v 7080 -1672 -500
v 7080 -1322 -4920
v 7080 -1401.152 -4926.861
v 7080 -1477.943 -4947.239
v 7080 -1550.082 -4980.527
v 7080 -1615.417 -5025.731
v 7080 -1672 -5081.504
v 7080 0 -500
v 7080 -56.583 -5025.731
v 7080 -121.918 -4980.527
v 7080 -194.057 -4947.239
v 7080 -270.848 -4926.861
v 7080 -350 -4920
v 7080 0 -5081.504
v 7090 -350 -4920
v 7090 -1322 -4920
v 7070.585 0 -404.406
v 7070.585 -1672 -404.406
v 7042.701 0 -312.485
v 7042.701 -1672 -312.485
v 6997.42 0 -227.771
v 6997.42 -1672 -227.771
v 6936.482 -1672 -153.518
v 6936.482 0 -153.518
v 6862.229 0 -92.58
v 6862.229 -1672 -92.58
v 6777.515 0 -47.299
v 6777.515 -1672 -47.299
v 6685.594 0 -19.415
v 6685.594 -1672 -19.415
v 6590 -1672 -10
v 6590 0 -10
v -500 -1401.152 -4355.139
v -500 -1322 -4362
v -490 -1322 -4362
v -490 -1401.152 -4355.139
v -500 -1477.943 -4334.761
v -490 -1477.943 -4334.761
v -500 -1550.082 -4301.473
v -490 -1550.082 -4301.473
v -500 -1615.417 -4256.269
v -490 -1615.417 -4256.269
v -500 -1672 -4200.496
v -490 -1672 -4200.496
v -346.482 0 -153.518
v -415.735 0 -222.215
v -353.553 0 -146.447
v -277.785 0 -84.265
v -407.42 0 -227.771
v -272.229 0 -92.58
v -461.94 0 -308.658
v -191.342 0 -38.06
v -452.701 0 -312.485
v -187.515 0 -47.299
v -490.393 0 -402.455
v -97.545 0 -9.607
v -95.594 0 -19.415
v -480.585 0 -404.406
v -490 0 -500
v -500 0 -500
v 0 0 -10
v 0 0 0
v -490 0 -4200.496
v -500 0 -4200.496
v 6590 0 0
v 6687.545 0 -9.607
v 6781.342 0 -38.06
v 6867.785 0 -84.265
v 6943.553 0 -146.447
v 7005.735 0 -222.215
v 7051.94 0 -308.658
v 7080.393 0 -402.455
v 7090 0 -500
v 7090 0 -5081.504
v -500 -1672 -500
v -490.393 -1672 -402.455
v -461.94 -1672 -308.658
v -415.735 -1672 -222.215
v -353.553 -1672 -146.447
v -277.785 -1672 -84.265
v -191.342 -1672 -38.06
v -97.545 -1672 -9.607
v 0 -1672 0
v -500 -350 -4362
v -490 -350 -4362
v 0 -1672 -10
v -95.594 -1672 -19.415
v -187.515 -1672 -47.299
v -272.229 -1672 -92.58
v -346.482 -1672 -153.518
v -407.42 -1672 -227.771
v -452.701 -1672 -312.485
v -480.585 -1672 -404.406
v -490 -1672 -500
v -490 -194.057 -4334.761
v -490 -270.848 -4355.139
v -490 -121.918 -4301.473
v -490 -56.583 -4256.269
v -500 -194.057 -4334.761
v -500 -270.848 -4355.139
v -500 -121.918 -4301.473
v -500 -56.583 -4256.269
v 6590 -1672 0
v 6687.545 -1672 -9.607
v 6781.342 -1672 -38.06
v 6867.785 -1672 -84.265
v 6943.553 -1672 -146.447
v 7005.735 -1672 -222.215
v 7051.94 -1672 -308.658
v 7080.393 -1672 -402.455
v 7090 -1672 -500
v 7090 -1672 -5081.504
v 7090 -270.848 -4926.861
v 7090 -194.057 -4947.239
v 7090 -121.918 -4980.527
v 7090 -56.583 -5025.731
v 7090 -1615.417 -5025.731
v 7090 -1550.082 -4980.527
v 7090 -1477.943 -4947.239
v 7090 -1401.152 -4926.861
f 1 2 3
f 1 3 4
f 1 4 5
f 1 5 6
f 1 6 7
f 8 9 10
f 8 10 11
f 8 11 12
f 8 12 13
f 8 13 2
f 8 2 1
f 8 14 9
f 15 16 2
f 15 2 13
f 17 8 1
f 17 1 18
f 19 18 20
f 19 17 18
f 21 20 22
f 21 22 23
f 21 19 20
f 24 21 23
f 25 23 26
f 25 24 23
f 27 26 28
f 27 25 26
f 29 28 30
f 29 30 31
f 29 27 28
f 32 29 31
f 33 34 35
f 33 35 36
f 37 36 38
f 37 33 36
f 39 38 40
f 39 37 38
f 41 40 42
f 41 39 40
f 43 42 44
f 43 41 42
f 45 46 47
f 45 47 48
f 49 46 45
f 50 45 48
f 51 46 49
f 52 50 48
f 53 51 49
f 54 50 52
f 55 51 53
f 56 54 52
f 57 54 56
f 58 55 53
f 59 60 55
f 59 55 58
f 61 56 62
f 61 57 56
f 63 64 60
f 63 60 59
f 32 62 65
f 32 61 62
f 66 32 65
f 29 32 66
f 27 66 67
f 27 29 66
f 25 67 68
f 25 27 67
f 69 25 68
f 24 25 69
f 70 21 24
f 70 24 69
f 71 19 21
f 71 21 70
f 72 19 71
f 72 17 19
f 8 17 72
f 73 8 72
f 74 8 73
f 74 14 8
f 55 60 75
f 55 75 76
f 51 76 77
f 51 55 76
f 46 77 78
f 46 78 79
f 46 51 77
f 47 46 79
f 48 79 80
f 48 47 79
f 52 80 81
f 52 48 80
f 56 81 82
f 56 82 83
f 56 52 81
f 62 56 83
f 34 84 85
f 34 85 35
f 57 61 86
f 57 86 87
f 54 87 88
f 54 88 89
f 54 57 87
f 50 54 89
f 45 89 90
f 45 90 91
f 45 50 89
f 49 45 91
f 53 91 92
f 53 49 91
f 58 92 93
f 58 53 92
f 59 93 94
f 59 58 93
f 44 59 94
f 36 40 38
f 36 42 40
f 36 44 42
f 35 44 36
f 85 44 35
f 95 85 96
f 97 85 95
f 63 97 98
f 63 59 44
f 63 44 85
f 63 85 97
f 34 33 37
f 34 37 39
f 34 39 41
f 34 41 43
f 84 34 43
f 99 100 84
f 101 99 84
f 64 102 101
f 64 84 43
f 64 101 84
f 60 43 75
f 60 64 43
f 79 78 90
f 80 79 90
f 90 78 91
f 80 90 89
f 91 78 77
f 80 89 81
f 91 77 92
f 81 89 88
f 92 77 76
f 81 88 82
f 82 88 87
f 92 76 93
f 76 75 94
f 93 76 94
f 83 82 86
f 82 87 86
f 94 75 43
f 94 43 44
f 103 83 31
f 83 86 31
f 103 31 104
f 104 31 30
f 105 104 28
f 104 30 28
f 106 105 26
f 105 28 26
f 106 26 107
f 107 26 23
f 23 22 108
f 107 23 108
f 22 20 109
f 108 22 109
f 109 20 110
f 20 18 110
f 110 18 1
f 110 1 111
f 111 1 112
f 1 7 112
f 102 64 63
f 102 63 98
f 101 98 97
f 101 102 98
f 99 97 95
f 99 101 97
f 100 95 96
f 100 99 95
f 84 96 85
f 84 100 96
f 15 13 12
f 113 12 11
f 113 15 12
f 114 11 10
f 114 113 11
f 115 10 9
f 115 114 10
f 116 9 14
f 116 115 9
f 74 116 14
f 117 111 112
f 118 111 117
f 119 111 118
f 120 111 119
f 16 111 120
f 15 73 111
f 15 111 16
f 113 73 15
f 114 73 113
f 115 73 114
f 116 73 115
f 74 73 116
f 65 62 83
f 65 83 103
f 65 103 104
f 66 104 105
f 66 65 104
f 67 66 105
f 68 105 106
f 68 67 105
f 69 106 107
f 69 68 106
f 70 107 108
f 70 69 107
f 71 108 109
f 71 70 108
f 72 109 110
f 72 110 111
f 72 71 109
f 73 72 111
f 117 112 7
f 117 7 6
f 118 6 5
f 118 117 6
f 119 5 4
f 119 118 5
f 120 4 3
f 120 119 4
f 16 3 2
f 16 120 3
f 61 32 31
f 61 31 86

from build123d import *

# Parameters (mm, degrees)
BOSS_EXTRUDE2_DEPTH = 1672
CUT_EXTRUDE2_DEPTH  = 20
CUT_EXTRUDE3_DEPTH  = 20


with BuildPart() as part:
    # Sketch2 → Boss-Extrude2 (new body)
    with BuildSketch(Plane(origin=(0, 0, 0), x_dir=(1, 0, 0), z_dir=(0, 1, 0))):
        with BuildLine():
            Line((0, 0), (6590, 0))
            ThreePointArc((6590, 0), (6943.553390593, 146.446609407), (7090, 500))
            Line((7090, 500), (7090, 8890))
            Line((7090, 8890), (7080, 8890))
            Line((7080, 8890), (7080, 500))
            ThreePointArc((7080, 500), (6936.482322781, 153.517677219), (6590, 10))
            Line((6590, 10), (0, 10))
            ThreePointArc((0, 10), (-346.482322781, 153.517677219), (-490, 500))
            Line((-490, 500), (-490, 8890))
            Line((-490, 8890), (-500, 8890))
            Line((-500, 8890), (-500, 500))
            ThreePointArc((-500, 500), (-353.553390593, 146.446609407), (0, 0))
        make_face()
    extrude(amount=-BOSS_EXTRUDE2_DEPTH)

    # Sketch3 → Cut-Extrude2 (cut)
    with BuildSketch(Plane.ZY.offset(500)):
        with BuildLine():
            Line((-4822, 110), (-3902, 110))
            ThreePointArc((-3902, 110), (-4227.269119346, -24.730880654), (-4362, -350))
            Line((-4362, -350), (-4362, -1322))
            ThreePointArc((-4362, -1322), (-4260.95507876, -1609.665172436), (-4002.211950294, -1770.951628818))
            Line((-4002.211950294, -1770.951628818), (-4822, -1782))
            Line((-4822, -1782), (-9056.882603438, -1782))
            Line((-9056.882603438, -1782), (-9056.882603438, 110))
            Line((-9056.882603438, 110), (-4822, 110))
        make_face()
    extrude(amount=-CUT_EXTRUDE2_DEPTH, mode=Mode.SUBTRACT)

    # Sketch4 → Cut-Extrude3 (cut)
    with BuildSketch(Plane(origin=(7090, 0, 0), x_dir=(0, 0, -1), z_dir=(1, 0, 0))):
        with BuildLine():
            Line((5380, 110), (9554.66965043, 110))
            Line((9554.66965043, 110), (9554.66965043, -1782))
            Line((9554.66965043, -1782), (5380, -1782))
            ThreePointArc((5380, -1782), (5054.730880654, -1647.269119346), (4920, -1322))
            Line((4920, -1322), (4920, -350))
            ThreePointArc((4920, -350), (5054.730880654, -24.730880654), (5380, 110))
        make_face()
    extrude(amount=-CUT_EXTRUDE3_DEPTH, mode=Mode.SUBTRACT)


solid = part.part
